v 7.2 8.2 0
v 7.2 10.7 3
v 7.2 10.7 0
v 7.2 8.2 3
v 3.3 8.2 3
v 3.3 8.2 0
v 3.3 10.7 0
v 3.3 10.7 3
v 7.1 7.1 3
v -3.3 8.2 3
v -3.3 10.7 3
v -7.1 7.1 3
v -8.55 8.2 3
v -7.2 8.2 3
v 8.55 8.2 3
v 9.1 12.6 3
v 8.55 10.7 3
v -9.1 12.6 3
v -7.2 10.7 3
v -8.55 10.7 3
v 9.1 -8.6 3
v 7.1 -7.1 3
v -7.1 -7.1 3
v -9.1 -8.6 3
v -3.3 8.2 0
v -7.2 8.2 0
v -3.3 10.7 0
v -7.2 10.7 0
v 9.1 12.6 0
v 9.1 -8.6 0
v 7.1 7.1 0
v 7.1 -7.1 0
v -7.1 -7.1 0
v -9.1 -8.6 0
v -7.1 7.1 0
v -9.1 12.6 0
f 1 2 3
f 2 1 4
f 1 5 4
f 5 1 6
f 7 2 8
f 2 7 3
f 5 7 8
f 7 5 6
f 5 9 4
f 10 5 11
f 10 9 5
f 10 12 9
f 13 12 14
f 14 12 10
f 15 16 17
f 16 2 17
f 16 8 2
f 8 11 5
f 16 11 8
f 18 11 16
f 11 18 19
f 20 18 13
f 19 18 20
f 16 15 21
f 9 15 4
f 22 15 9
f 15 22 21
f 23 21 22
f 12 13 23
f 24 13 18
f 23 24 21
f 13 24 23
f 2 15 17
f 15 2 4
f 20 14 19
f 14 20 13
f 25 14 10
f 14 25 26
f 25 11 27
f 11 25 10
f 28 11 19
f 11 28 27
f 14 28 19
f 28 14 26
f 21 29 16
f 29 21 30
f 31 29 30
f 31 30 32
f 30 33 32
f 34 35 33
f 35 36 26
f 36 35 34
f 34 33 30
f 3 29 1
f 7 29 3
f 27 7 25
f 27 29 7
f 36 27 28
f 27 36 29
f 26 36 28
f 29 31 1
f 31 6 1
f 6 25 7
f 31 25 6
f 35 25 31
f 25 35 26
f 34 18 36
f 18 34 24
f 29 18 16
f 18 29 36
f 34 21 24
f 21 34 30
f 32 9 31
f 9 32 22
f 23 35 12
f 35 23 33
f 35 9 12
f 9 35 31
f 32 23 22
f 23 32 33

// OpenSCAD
difference () {
  translate ([0, 2, 3/2]) {
    cube ([18.2, 21.2, 3], center=true);
  }
  translate ([0, 0, 3/2]) {
    cube ([14.2, 14.2, 3], center=true);
  }
  translate ([0, 10.7, -5.5]) {
    rotate (a=90.0, v=[1, 0, 0]) {
      union () {
        translate ([3.3, 0, 0]) {
          cube ([3.9, 10, 2.5]);
        }
        translate ([4.8999999999999995, 8.5, 0]) {
          cube ([3.65, 2, 2.5]);
        }
        translate ([-3.3, 0, 0]) {
          mirror ([1, 0, ]) {
            cube ([3.9, 10, 2.5]);
          }
        }
        translate ([-4.8999999999999995, 8.5, 0]) {
          mirror ([1, 0, ]) {
            cube ([3.65, 2, 2.5]);
          }
        }
      }
    }
  }
}
